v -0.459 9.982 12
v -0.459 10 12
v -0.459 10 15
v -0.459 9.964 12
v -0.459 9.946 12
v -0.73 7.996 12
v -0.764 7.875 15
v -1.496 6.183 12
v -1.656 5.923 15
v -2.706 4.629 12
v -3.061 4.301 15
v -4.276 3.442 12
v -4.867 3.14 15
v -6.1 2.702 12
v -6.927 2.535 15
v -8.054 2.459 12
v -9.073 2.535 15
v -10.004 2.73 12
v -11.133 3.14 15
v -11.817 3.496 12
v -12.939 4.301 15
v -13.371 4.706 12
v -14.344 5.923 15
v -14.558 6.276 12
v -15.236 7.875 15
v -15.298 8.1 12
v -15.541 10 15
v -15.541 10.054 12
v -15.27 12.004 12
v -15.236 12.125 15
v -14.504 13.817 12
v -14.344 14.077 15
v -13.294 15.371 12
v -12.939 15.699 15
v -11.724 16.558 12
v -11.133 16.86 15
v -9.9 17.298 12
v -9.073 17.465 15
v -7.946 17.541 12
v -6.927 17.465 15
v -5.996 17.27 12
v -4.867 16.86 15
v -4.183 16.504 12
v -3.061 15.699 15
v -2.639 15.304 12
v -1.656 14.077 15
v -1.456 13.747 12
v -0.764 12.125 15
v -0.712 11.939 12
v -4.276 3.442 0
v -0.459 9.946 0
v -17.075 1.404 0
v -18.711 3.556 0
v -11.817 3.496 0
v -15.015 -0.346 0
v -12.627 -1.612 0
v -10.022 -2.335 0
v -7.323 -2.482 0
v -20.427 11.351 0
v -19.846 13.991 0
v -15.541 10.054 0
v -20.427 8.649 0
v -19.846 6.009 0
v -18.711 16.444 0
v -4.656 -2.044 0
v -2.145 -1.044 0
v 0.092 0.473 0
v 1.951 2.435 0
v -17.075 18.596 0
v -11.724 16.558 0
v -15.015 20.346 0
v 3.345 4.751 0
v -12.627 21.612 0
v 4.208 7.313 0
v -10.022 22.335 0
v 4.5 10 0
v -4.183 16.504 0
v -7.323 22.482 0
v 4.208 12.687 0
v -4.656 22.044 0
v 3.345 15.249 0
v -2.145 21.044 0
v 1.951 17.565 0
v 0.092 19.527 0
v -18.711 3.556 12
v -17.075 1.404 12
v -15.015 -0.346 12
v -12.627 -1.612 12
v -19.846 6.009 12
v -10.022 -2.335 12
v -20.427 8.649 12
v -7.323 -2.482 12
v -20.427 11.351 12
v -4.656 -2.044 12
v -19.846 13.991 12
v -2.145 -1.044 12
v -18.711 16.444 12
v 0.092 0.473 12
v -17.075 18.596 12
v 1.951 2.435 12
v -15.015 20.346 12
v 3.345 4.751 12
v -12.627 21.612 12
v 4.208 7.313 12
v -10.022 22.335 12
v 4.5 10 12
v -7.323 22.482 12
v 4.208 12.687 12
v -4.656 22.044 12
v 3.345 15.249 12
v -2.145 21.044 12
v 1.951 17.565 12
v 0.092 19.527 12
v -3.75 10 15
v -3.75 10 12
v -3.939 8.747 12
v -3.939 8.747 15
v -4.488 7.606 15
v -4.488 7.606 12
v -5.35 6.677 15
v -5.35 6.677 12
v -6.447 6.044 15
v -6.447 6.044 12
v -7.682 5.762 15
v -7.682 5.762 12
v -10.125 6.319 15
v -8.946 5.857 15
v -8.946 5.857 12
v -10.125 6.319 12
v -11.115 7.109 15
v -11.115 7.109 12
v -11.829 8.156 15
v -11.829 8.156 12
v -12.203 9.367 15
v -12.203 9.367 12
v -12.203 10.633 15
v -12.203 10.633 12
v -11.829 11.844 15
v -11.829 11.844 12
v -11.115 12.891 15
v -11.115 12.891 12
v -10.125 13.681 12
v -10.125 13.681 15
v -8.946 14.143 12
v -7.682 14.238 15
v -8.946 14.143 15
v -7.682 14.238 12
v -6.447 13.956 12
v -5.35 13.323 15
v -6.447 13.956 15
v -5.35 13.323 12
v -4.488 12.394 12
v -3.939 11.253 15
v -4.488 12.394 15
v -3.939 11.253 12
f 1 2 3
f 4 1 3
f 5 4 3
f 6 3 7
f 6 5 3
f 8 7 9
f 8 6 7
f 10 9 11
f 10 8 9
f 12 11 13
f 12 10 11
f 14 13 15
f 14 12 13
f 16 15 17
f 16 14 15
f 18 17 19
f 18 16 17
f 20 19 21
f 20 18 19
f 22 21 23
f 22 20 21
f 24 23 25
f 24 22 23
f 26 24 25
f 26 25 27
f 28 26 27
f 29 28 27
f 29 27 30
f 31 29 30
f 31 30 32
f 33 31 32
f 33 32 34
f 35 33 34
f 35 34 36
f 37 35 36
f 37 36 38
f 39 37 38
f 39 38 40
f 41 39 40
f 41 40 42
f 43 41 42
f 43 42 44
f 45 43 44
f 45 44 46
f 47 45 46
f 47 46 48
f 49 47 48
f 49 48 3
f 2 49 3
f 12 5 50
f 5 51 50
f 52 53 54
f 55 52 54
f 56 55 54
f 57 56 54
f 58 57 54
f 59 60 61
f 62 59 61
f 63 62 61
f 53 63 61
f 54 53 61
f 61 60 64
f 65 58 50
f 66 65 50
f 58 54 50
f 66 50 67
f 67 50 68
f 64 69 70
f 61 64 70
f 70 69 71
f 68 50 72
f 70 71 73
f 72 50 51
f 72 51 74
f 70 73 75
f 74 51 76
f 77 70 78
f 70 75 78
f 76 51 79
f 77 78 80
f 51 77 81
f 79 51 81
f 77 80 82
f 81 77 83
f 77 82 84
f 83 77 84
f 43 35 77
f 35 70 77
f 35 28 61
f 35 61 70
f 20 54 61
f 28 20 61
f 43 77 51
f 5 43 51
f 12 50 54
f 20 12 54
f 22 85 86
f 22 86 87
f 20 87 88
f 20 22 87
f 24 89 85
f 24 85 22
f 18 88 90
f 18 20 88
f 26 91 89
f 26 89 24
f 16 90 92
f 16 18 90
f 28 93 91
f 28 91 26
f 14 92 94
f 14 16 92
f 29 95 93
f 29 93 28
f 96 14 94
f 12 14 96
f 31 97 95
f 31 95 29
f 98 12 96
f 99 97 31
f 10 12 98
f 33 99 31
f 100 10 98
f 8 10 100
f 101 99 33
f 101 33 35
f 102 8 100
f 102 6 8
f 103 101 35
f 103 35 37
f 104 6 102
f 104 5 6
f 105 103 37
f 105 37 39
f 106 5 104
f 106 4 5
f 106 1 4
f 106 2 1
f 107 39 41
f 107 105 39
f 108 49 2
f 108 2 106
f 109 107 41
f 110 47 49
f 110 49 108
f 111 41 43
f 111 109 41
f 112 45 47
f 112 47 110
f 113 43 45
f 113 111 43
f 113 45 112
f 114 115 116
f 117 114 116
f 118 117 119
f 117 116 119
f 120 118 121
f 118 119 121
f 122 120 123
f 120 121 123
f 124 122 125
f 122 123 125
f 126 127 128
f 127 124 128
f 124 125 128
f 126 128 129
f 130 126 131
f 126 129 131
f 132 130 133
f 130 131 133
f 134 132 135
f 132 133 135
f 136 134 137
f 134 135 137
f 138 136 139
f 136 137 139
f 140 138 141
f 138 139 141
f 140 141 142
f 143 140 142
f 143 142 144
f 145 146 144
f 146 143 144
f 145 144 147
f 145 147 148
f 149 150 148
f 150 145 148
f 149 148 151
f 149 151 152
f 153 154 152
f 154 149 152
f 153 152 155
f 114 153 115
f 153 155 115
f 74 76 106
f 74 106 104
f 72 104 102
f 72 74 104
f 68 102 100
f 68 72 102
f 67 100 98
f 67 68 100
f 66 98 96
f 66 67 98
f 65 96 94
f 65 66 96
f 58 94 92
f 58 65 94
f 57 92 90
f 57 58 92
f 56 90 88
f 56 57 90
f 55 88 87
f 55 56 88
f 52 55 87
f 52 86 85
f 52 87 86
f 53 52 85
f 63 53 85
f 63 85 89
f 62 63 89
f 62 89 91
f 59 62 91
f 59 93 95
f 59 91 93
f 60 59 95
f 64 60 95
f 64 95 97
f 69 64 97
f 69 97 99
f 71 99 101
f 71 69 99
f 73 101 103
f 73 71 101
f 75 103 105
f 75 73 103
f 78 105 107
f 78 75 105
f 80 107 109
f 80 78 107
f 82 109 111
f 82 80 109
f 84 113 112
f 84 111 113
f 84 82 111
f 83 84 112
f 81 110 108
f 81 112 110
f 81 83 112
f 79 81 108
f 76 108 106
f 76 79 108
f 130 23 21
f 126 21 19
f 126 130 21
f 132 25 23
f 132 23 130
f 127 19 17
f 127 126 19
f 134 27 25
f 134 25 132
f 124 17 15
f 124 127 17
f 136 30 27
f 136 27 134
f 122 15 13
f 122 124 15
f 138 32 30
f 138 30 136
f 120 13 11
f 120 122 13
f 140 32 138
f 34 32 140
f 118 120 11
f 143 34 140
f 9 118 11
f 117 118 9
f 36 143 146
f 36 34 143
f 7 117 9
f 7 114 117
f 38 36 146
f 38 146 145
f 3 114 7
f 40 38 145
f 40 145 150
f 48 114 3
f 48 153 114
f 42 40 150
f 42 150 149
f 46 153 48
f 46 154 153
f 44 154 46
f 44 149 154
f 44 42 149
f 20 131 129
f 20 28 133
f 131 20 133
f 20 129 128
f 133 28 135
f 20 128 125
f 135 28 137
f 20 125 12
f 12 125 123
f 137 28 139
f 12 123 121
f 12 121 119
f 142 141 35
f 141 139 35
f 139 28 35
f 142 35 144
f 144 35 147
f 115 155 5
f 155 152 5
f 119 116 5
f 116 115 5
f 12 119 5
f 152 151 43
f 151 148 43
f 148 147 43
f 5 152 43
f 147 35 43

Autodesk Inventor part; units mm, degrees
ref_plane "YZ Plane" through (0, 0, 0) normal (1, 0, 0) x (0, 1, 0)
ref_plane "XZ Plane" through (0, 0, 0) normal (0, 1, 0) x (-1, 0, 0)
ref_plane "XY Plane" through (0, 0, 0) normal (0, 0, 1) x (1, 0, 0)
sketch "Sketch1" plane through (0, 0, 0) normal (0, 0, 1) x (1, 0, 0)
  line L0 (-14.3448, 13.9006) -> (-7.8021, 17.4592)
  line L1 (-14.3448, 13.9006) -> (-14.5342, 6.4551)
  line L2 (-14.5342, 6.4551) -> (-8.1811, 2.5683)
  line L3 (-8.1811, 2.5683) -> (-1.6384, 6.127)
  line L4 (-1.4489, 13.5724) -> (-1.6384, 6.127)
  line L5 (-7.8021, 17.4592) -> (-1.4489, 13.5724)
  circle A0 centre (-8, 10) radius 4
  circle A1 centre (-8, 10) radius 7.5414
  line L6 (-4.1827, 16.5039) -> (-0.4588, 9.9461)
  line L7 (-0.4588, 9.9461) -> (-4.2761, 3.4422)
  line L8 (-4.2761, 3.4422) -> (-11.8173, 3.4961)
  line L9 (-11.8173, 3.4961) -> (-15.5412, 10.0539)
  line L10 (-15.5412, 10.0539) -> (-11.7239, 16.5578)
  line L11 (-11.7239, 16.5578) -> (-4.1827, 16.5039)
  circle A2 centre (-8, 10) radius 4.25
  circle A3 centre (-8, 10) radius 12.5
  point P0 (0, 0)
extrude "Extrusion1" add sketch "Sketch1" along normal blind 12 contours L1 L10 A1 L0 | L0 L10 L1 | L11 A1 L5 L0 | L0 L5 L11 | L9 L2 L1 | L1 L2 L9 A1 | A1 L6 L4 L5 | L8 L2 L3 A1 | L5 L4 L6 | L8 L3 L2 | L7 L3 L4 A1 | L7 L4 L3 | A3
sketch "Sketch2" plane through (-8, 10, 12) normal (0, 0, 1) x (1, 0, 0)
  circle A0 centre (0, 0) radius 4.25
  line L0 (7.5412, -0.0539) -> (3.7239, -6.5578) projected
  circle A1 centre (0, 0) radius 7.5414
  point P0 (8, -10)
  dimension "d4" = 8.5
extrude "Extrusion2" add sketch "Sketch2" along normal blind 3
properties part number "gear1"
